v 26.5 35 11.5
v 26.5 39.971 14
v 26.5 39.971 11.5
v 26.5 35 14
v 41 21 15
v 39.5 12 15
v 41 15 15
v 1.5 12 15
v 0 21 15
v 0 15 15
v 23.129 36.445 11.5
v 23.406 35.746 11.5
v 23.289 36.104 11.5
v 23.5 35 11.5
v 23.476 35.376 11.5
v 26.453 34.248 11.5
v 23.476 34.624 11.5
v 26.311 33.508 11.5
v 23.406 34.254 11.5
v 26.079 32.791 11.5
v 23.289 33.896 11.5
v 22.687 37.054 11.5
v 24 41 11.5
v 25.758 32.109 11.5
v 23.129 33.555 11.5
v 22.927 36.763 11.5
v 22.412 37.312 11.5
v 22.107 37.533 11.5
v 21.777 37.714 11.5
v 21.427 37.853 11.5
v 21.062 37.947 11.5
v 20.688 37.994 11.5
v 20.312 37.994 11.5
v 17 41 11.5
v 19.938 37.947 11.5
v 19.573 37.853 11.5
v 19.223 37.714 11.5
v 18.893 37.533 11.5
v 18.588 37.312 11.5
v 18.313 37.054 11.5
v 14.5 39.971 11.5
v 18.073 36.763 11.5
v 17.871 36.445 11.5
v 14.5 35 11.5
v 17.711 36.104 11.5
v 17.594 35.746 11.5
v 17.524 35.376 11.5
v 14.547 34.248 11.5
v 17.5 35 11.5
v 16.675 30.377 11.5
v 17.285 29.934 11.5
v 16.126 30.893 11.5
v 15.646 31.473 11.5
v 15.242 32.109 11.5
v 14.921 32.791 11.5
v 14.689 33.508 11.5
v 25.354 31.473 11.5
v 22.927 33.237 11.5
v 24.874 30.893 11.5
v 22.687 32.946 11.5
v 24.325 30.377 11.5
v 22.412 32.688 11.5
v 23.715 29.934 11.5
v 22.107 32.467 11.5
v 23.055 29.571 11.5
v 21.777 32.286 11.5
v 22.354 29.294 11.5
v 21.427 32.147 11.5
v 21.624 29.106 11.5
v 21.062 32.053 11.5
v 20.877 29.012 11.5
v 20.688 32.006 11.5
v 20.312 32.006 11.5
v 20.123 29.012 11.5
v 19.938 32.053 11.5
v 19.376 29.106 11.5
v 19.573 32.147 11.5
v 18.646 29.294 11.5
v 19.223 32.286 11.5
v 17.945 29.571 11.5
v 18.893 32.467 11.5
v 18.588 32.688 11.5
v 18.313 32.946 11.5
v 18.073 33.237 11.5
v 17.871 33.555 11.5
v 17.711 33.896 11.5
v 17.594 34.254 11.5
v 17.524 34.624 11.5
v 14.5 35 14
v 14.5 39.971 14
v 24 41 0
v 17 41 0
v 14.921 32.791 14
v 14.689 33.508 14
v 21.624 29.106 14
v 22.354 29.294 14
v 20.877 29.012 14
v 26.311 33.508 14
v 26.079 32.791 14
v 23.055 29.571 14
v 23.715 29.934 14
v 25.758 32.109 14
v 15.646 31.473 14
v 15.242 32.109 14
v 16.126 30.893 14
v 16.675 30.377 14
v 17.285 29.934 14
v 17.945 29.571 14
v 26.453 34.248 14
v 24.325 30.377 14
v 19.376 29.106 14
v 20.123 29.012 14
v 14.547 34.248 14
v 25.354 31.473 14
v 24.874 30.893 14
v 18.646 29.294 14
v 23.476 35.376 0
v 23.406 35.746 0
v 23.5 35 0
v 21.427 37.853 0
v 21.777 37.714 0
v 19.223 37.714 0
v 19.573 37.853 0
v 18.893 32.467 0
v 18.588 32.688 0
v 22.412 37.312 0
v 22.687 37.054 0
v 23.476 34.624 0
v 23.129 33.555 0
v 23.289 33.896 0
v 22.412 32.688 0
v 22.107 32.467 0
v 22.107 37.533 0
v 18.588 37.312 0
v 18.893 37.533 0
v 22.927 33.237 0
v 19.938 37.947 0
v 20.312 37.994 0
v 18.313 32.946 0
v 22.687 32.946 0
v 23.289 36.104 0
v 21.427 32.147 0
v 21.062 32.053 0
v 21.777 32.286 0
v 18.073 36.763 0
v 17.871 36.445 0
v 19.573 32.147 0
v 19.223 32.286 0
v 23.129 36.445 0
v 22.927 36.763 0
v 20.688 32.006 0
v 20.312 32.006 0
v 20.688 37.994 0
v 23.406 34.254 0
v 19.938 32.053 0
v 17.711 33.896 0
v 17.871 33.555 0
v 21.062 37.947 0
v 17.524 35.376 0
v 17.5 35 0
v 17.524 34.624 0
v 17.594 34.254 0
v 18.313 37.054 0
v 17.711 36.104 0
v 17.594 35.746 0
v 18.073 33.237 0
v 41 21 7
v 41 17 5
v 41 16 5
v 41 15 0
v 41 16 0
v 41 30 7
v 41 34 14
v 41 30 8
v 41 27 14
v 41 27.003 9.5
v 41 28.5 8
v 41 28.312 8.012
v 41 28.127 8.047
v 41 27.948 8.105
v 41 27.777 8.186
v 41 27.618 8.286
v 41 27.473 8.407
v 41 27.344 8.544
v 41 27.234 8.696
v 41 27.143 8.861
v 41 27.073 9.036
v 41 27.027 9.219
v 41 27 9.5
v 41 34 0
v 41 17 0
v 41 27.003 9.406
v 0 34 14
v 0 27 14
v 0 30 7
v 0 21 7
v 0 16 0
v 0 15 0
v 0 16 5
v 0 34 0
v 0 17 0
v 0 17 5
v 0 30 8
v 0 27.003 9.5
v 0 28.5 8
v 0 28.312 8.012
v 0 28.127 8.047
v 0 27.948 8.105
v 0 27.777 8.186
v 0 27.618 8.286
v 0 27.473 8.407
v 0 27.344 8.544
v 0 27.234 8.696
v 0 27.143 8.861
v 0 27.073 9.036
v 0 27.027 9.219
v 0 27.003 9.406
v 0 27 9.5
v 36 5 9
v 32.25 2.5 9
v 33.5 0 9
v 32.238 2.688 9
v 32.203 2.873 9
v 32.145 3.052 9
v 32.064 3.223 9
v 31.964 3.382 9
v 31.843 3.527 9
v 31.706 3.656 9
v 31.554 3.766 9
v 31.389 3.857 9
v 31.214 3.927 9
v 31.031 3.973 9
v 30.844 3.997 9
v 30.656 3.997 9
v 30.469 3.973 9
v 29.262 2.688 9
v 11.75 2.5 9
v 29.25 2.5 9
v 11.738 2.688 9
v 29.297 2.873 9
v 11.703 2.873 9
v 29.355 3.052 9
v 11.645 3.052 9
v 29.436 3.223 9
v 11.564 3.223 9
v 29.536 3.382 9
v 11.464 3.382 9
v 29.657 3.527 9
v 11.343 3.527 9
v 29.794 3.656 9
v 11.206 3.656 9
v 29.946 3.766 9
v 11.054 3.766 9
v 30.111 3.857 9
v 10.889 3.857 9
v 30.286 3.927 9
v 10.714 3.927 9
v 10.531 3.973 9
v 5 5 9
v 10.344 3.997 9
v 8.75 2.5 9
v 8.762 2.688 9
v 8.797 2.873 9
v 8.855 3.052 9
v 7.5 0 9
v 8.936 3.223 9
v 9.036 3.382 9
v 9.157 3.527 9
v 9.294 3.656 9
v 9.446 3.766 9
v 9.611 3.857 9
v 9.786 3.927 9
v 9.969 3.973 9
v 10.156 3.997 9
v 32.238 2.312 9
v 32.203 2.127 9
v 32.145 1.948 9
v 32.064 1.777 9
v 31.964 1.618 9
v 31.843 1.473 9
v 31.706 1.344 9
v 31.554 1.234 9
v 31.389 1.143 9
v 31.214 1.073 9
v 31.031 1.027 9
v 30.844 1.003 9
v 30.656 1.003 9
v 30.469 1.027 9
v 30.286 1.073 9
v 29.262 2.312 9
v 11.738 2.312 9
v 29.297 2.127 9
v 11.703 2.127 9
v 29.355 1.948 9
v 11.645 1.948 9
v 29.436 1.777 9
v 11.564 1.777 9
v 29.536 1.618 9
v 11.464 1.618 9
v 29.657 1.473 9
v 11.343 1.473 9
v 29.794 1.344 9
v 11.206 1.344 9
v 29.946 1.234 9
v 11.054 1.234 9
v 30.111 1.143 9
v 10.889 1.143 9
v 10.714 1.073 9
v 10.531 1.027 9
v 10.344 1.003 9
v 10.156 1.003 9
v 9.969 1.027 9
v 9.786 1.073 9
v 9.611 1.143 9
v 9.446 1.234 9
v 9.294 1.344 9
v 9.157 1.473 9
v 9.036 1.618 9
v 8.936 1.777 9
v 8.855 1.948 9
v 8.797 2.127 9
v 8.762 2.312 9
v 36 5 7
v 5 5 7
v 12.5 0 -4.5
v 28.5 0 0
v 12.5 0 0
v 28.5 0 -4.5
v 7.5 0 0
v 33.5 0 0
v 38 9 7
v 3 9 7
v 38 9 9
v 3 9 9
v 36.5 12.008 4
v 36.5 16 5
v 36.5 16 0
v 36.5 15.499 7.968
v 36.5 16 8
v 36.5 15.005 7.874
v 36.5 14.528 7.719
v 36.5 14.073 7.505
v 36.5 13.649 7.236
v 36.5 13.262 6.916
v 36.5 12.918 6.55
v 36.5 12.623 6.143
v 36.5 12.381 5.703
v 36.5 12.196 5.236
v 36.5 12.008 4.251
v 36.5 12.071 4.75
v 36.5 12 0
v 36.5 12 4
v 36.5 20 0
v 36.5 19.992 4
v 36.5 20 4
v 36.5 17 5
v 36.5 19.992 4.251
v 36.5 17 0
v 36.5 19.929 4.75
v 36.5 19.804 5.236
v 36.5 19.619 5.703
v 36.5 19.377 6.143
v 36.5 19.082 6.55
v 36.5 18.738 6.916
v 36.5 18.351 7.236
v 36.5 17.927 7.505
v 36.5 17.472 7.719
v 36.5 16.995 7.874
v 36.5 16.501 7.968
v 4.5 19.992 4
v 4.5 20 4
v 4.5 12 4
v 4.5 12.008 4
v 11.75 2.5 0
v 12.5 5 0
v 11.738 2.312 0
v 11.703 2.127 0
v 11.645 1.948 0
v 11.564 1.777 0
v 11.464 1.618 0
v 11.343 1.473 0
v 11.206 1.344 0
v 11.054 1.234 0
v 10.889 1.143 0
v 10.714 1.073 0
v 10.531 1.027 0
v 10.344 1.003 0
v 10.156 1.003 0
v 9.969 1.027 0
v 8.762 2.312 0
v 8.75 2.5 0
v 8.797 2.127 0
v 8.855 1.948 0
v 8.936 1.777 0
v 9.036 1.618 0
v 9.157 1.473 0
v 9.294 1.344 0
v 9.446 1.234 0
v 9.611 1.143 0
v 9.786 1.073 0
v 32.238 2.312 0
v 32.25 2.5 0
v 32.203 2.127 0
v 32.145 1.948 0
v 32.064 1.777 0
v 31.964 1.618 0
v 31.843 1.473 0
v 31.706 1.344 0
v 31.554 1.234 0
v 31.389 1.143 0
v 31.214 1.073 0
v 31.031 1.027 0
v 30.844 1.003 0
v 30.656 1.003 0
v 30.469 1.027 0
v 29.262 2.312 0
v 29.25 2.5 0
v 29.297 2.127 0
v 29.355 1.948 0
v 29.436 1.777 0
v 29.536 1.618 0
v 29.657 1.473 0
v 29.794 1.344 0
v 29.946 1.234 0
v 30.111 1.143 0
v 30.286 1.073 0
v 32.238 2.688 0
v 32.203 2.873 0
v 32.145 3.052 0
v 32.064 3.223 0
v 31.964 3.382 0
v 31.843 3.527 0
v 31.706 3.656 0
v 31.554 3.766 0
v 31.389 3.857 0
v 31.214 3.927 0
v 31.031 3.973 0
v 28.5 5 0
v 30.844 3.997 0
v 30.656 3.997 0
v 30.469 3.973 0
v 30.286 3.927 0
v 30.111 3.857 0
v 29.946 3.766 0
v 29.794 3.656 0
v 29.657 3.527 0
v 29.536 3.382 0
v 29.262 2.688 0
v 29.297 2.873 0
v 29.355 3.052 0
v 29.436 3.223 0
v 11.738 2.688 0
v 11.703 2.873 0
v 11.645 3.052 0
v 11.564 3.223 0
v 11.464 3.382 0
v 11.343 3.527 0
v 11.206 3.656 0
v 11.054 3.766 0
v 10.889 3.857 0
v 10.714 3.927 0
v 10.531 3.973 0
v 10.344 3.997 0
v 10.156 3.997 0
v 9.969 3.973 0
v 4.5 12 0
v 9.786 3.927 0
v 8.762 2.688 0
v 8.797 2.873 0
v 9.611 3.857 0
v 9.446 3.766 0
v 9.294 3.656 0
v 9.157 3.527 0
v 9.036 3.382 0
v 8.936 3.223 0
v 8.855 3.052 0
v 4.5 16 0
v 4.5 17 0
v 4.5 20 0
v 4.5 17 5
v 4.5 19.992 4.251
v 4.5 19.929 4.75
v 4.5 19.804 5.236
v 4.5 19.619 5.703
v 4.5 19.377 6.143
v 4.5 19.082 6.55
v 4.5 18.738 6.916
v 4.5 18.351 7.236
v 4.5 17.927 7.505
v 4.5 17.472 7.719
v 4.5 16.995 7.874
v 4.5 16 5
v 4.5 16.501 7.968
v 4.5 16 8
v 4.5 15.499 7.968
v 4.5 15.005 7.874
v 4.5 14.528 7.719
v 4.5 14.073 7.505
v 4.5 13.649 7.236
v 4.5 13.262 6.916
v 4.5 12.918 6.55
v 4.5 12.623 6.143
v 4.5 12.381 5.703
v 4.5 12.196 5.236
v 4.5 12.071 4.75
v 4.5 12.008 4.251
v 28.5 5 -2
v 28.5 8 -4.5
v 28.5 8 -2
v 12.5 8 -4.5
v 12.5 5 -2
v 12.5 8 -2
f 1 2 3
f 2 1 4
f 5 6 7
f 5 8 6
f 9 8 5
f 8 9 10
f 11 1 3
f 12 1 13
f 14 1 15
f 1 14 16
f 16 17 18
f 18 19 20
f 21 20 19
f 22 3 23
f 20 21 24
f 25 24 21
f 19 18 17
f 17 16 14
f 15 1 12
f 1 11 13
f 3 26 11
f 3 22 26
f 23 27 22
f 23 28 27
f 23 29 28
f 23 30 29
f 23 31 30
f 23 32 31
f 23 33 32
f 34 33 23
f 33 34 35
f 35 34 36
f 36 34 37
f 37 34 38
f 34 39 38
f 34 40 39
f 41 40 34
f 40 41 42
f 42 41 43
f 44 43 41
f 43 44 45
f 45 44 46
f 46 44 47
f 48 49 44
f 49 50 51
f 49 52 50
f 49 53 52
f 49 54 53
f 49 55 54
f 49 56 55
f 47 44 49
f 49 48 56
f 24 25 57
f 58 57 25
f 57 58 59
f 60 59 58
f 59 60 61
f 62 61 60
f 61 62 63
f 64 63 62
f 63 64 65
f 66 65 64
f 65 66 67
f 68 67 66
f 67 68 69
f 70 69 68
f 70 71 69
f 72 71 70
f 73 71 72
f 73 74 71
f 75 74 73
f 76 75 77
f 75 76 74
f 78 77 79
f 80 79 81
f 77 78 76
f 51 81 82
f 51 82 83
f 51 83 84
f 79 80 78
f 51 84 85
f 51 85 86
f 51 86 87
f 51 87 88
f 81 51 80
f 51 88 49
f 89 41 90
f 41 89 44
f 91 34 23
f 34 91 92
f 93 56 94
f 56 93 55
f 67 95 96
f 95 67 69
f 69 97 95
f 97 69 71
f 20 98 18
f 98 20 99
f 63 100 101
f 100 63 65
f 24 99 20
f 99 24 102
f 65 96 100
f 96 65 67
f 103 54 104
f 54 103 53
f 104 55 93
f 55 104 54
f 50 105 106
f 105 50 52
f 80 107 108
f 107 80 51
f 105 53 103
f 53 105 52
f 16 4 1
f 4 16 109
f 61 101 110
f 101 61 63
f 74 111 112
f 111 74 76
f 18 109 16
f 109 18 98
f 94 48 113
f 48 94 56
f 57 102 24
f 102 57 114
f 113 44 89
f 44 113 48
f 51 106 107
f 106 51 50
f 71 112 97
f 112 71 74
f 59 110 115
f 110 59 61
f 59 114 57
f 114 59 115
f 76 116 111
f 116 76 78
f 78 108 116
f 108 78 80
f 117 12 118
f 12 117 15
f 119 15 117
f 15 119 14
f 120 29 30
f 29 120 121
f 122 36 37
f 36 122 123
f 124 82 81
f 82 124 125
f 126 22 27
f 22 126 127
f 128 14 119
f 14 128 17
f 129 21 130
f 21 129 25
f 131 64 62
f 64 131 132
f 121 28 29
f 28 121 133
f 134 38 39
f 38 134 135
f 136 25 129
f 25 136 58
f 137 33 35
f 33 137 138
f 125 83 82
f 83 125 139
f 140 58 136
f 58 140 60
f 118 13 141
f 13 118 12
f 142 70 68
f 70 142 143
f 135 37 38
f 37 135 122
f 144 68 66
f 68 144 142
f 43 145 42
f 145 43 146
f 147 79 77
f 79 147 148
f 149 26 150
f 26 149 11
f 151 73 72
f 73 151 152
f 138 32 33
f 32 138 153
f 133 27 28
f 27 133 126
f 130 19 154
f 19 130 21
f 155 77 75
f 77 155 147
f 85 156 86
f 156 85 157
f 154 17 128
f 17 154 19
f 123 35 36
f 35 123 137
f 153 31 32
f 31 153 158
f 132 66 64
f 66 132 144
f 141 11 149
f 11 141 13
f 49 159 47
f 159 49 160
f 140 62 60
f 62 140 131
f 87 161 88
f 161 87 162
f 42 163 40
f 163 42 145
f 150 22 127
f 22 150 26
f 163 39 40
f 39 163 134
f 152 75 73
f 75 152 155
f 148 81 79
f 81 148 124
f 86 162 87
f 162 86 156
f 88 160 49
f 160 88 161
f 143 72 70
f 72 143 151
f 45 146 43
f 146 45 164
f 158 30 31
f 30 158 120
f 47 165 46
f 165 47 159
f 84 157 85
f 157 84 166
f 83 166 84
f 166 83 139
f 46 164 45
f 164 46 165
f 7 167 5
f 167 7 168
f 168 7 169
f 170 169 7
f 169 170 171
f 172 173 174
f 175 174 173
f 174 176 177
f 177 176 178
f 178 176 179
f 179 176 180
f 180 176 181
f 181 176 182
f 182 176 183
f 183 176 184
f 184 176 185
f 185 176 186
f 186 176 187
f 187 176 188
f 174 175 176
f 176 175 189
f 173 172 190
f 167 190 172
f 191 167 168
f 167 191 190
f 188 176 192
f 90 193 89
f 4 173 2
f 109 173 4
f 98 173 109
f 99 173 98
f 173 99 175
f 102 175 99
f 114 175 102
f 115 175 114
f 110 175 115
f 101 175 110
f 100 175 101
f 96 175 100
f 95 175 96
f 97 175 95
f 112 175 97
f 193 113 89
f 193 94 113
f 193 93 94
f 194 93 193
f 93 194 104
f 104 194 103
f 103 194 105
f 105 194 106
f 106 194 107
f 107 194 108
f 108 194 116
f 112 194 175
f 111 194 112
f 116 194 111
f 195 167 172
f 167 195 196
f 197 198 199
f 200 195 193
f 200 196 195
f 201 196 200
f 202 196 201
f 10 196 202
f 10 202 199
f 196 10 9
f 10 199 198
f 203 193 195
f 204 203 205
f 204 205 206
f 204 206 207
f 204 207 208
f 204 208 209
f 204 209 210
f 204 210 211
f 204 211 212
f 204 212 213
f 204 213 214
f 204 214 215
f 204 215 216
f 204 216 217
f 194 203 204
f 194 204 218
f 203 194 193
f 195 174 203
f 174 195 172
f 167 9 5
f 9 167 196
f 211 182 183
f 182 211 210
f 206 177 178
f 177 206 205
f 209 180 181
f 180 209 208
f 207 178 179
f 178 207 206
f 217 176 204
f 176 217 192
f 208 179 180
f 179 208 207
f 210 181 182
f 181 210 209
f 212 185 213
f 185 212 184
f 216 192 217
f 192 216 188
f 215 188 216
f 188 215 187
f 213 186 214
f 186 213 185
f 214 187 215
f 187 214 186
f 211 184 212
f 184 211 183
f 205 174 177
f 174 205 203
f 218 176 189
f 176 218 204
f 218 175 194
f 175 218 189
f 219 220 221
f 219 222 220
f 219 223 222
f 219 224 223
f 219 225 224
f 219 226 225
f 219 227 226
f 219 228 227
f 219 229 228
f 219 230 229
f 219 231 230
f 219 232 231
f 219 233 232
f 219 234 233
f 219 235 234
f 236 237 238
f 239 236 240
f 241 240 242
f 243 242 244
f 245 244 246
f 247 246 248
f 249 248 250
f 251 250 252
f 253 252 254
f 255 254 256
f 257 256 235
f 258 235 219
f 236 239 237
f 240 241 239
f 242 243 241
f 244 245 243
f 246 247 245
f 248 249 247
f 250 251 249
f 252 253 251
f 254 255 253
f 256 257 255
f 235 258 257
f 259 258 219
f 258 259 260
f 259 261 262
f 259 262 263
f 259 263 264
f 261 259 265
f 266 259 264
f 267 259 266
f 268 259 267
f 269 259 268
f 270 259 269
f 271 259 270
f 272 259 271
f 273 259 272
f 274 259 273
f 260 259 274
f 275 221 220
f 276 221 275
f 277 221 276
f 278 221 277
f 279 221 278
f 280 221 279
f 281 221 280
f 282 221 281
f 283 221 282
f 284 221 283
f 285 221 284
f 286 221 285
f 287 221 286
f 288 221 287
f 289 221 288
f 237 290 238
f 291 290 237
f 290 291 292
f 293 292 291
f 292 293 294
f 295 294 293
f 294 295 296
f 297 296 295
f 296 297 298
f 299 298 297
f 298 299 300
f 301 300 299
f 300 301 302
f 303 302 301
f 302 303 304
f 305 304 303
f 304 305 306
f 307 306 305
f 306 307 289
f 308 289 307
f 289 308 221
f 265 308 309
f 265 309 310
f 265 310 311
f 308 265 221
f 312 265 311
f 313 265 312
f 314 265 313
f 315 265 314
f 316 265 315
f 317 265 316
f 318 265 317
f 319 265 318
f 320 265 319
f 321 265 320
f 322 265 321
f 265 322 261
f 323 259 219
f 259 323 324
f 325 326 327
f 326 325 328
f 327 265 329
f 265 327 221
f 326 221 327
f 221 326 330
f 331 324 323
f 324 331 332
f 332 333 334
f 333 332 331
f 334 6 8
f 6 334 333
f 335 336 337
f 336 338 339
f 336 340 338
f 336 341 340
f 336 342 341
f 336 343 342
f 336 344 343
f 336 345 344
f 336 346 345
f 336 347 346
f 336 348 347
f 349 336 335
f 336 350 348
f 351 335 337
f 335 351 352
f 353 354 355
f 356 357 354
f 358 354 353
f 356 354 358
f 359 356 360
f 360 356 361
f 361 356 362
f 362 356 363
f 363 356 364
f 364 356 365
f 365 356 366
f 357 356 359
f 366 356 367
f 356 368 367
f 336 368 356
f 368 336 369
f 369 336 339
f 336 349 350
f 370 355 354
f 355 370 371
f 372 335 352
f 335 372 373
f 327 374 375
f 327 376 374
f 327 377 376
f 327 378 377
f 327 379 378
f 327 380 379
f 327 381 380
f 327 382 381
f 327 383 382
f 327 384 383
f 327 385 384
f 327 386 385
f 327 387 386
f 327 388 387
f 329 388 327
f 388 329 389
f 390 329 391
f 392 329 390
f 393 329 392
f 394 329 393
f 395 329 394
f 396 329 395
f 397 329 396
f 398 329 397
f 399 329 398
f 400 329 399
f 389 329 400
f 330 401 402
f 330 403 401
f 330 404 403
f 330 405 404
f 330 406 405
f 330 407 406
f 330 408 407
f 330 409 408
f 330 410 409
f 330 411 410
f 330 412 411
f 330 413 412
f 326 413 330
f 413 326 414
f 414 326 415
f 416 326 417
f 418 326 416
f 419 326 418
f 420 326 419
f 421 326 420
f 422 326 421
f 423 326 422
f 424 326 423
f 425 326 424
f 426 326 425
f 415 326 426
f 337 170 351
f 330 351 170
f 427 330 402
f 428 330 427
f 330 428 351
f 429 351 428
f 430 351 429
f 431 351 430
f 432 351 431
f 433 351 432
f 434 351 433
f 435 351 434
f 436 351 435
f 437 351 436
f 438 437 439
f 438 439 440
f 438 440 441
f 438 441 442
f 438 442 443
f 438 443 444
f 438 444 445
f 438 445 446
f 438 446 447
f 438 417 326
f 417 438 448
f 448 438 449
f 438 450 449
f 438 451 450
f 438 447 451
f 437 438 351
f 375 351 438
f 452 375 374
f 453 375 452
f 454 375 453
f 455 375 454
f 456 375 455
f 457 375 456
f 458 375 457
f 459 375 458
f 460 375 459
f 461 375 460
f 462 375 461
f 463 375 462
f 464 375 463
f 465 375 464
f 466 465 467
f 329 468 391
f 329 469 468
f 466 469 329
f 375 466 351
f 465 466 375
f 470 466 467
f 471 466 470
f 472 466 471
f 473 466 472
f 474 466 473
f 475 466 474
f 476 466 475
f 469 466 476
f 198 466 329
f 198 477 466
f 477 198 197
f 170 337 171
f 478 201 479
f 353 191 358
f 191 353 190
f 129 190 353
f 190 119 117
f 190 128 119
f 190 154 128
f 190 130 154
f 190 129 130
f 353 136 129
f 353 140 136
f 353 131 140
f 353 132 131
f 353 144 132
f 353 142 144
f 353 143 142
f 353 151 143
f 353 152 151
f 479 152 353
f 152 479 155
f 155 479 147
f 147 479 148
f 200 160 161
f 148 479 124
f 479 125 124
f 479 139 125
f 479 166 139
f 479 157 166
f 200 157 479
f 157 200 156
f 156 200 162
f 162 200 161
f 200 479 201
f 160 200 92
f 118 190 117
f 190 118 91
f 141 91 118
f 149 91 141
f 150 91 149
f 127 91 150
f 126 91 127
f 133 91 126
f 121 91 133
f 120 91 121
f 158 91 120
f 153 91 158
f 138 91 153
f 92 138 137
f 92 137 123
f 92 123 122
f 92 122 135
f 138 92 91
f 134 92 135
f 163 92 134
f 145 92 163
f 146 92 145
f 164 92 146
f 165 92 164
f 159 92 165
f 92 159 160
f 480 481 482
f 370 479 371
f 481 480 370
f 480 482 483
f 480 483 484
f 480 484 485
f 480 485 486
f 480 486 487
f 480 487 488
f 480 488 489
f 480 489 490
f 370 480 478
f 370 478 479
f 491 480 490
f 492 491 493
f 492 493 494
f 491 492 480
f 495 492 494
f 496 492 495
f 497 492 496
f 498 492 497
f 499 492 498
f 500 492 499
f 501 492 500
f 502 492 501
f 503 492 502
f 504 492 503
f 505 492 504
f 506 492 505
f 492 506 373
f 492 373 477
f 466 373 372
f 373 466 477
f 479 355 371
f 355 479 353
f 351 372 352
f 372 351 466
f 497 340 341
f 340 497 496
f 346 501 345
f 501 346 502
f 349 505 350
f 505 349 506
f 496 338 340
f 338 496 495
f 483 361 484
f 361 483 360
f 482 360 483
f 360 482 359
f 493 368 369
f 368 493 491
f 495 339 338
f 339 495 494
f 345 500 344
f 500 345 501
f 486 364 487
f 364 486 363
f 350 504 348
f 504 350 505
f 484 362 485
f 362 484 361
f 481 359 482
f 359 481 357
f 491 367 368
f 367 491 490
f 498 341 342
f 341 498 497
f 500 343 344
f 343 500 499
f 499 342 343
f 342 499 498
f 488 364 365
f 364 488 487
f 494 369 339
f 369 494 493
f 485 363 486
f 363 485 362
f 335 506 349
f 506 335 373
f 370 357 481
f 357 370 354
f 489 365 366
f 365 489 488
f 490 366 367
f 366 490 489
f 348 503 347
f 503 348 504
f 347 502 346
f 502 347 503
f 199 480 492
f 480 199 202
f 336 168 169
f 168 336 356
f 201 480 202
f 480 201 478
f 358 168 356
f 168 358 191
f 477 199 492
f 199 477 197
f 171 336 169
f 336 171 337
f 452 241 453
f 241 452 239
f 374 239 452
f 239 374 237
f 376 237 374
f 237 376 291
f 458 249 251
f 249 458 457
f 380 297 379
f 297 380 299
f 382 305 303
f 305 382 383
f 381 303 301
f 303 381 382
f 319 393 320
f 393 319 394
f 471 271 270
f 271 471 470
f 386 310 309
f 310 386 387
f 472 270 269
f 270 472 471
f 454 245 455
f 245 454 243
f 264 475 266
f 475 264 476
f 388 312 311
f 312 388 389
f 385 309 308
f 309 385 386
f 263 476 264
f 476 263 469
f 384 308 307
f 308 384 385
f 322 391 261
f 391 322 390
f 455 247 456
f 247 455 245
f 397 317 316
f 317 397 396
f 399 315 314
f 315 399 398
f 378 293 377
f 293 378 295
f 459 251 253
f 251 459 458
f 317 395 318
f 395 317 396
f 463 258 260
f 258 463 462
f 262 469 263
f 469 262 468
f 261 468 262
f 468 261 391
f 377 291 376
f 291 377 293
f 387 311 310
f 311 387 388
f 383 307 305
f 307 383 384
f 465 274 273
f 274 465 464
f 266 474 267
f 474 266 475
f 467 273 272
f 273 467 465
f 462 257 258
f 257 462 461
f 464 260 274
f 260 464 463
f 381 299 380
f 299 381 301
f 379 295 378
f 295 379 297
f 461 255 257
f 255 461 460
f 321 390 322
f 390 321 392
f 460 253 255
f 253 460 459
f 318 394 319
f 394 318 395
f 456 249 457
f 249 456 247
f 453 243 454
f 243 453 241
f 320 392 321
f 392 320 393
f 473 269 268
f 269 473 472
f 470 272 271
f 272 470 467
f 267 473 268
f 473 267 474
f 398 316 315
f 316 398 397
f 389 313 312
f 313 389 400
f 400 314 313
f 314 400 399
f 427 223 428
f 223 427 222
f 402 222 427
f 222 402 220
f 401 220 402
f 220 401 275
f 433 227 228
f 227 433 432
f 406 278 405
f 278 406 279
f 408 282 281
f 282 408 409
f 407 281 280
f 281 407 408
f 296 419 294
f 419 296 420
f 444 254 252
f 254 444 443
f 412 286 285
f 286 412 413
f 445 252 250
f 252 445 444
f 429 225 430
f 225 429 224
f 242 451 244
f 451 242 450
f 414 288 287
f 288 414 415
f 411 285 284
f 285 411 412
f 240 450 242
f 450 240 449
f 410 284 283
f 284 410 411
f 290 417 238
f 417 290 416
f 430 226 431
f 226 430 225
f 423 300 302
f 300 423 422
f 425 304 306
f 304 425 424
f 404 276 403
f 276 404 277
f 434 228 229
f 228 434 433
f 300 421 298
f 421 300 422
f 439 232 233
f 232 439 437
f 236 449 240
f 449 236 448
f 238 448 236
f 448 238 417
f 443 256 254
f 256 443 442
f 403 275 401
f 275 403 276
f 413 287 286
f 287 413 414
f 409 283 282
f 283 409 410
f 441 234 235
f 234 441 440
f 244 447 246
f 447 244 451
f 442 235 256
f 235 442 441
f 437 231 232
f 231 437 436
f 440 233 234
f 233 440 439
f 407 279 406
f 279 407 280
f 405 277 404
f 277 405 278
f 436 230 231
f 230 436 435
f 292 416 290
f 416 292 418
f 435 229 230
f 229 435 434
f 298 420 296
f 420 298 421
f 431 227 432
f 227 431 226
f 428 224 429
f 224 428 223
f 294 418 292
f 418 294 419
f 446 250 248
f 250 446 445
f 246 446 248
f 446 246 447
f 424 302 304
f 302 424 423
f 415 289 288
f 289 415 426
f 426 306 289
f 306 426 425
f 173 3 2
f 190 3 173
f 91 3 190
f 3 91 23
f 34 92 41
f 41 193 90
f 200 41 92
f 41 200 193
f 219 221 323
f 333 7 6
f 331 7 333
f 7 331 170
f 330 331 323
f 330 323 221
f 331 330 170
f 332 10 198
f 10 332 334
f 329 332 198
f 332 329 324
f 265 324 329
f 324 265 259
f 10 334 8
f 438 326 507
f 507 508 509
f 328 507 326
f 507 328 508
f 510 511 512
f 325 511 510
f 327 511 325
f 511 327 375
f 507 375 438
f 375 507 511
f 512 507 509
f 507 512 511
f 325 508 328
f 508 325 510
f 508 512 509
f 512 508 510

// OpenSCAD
bx = 41;
by = 41;
bz = 15;
cox = 12;
coy = 6;
coz = 3.5;
track_y = 9;
track_z = 1;
spring_housing_x = 32;
spring_housing_y = 8;
spring_housing_z = 9;
tr_rounding_r = 1.5;
tr_coutout_h = 7;
mount_slot_x = 16;
mount_slot_y = 8;
mount_slot_z = 3.5;
mount_slot_gap = 1;
$fn =50;

debug = true;
module body() {
    color("Red") cube([bx, by,bz ], center=false);
}

module nut_cutout(){
    union() {

        color("Blue") cube([cox, coy,coz], center=false);
        color("Blue") translate([cox/2, 0, 0] ) 
            cylinder(h=coz, r=cox/2, center=false);
        
        color("Blue") translate([cox/2, 0, -12] ) 
            cylinder(h=bz, r=3, center=false);      
        
        
    }
}

    
module spring_housing(){
    translate([(bx-spring_housing_x)/2, 0,0]) 
        cube([spring_housing_x, spring_housing_y, spring_housing_y/2], center=false);
    
    translate([(bx-spring_housing_x)/2, spring_housing_y/2, spring_housing_y/2]) 
        rotate([0,90,0])  
        cylinder(h=spring_housing_x, r=spring_housing_y/2, center=false);
    
    translate([0, spring_housing_y/2,0]) 
        cube([bx, 1, 5]);
    }
    
    
module track(){    
    difference() {
        color("red") 
            cube([bx, track_y ,tr_coutout_h], center=false);
        
        color("green")    
            rotate([0,90,0]) 
            translate([-2.5, track_y - tr_rounding_r, 0] ) 
            cylinder(h=bx, r=tr_rounding_r, center=false);  
        
        color("blue") 
            translate([0, track_y-1.5, track_z] ) 
            cube([bx, tr_rounding_r , tr_coutout_h - track_z], center=false); 
     
         color("grey") 
            translate([0, track_y-3, track_z + tr_rounding_r] ) 
            cube([bx, tr_rounding_r * 2 ,tr_coutout_h - tr_rounding_r - track_z], center=false); 

    }
    
          translate([0, 0, tr_coutout_h] ) 
        cube([bx, 25, 3], center=false);  
}

module track_small(){
    translate([0,0,2]) 
        cube([bx, 5, 6]);
    translate([0, 5,0])   
        cube([bx, 4, 8]);
    translate([0, 9,8])    
        rotate([0,90,0]) 
        Right_Angled_Triangle(a=3, b=6,height=bx,  
            centerXYZ=[false,false,false]);
    }

module Right_Angled_Triangle(
			a, b, height=1, heights=undef,
			center=undef, centerXYZ=[false, false, false])
{
	Triangle(a=a, b=b, angle=90, height=height, heights=heights,
				center=center, centerXYZ=centerXYZ);
}

module corner_cutout(){
    Right_Angled_Triangle(a=17, b=7,height=bz,  centerXYZ=[false,false,false]);
    }
    
module corner_cutout_2(){
    Right_Angled_Triangle(a=15, b=(bx-26)/2,height=bz,  centerXYZ=[false,false,false]);
    }
    
module Triangle(
			a, b, angle, height=1, heights=undef,
			center=undef, centerXYZ=[false,false,false])
{
	// Calculate Heights at each point
	heightAB = ((heights==undef) ? height : heights[0])/2;
	heightBC = ((heights==undef) ? height : heights[1])/2;
	heightCA = ((heights==undef) ? height : heights[2])/2;
	centerZ = (center || (center==undef && centerXYZ[2]))?0:max(heightAB,heightBC,heightCA);

	// Calculate Offsets for centering
	offsetX = (center || (center==undef && centerXYZ[0]))?((cos(angle)*a)+b)/3:0;
	offsetY = (center || (center==undef && centerXYZ[1]))?(sin(angle)*a)/3:0;
	
	pointAB1 = [-offsetX,-offsetY, centerZ-heightAB];
	pointAB2 = [-offsetX,-offsetY, centerZ+heightAB];
	pointBC1 = [b-offsetX,-offsetY, centerZ-heightBC];
	pointBC2 = [b-offsetX,-offsetY, centerZ+heightBC];
	pointCA1 = [(cos(angle)*a)-offsetX,(sin(angle)*a)-offsetY, centerZ-heightCA];
	pointCA2 = [(cos(angle)*a)-offsetX,(sin(angle)*a)-offsetY, centerZ+heightCA];

	polyhedron(
		points=[	pointAB1, pointBC1, pointCA1,
					pointAB2, pointBC2, pointCA2 ],
		faces=[	
			[0, 1, 2],
			[3, 5, 4],
			[0, 3, 1],
			[1, 3, 4],
			[1, 4, 2],
			[2, 4, 5],
			[2, 5, 0],
			[0, 5, 3] ] );
}



module screwholes(){  
    translate([bx/4,0,0])
    cylinder(h=bz, r=1.5, center=false);
            
    translate([(bx/4)*3,0,0])
        cylinder(h=bz, r=1.5, center=false);  
    }
    
module mount_slot(){
    cube([mount_slot_x, mount_slot_y-3, mount_slot_z]);
    translate([0,0,-mount_slot_gap])
    cube([mount_slot_x, mount_slot_y, mount_slot_z - mount_slot_gap]);

    }
module main(){    
    
    difference() {

        body();
        translate([(bx-cox)/2, by-coy, bz-coz]) nut_cutout();
        translate([0, 21, 7]) track();
        translate([0, 0, bz-8]) track_small();
        translate([bx, bx,0]) mirror ([1,1,0]) corner_cutout();
        translate([0, bx,0]) rotate([180,180,90]) corner_cutout();
        translate([0, 12, 0]) spring_housing();
        
        translate([bx, 0,0]) mirror ([1,0,0]) corner_cutout_2();
                translate([0, 0,0]) mirror ([0,0,0]) corner_cutout_2();
        translate([0, 2.5])
            screwholes();
    }
    translate([(bx - mount_slot_x)/2, 0, -mount_slot_z]) mount_slot();
};
//track_small();
main();
//        translate([0, 0,0]) mirror ([0,0,0]) corner_cutout_2();
